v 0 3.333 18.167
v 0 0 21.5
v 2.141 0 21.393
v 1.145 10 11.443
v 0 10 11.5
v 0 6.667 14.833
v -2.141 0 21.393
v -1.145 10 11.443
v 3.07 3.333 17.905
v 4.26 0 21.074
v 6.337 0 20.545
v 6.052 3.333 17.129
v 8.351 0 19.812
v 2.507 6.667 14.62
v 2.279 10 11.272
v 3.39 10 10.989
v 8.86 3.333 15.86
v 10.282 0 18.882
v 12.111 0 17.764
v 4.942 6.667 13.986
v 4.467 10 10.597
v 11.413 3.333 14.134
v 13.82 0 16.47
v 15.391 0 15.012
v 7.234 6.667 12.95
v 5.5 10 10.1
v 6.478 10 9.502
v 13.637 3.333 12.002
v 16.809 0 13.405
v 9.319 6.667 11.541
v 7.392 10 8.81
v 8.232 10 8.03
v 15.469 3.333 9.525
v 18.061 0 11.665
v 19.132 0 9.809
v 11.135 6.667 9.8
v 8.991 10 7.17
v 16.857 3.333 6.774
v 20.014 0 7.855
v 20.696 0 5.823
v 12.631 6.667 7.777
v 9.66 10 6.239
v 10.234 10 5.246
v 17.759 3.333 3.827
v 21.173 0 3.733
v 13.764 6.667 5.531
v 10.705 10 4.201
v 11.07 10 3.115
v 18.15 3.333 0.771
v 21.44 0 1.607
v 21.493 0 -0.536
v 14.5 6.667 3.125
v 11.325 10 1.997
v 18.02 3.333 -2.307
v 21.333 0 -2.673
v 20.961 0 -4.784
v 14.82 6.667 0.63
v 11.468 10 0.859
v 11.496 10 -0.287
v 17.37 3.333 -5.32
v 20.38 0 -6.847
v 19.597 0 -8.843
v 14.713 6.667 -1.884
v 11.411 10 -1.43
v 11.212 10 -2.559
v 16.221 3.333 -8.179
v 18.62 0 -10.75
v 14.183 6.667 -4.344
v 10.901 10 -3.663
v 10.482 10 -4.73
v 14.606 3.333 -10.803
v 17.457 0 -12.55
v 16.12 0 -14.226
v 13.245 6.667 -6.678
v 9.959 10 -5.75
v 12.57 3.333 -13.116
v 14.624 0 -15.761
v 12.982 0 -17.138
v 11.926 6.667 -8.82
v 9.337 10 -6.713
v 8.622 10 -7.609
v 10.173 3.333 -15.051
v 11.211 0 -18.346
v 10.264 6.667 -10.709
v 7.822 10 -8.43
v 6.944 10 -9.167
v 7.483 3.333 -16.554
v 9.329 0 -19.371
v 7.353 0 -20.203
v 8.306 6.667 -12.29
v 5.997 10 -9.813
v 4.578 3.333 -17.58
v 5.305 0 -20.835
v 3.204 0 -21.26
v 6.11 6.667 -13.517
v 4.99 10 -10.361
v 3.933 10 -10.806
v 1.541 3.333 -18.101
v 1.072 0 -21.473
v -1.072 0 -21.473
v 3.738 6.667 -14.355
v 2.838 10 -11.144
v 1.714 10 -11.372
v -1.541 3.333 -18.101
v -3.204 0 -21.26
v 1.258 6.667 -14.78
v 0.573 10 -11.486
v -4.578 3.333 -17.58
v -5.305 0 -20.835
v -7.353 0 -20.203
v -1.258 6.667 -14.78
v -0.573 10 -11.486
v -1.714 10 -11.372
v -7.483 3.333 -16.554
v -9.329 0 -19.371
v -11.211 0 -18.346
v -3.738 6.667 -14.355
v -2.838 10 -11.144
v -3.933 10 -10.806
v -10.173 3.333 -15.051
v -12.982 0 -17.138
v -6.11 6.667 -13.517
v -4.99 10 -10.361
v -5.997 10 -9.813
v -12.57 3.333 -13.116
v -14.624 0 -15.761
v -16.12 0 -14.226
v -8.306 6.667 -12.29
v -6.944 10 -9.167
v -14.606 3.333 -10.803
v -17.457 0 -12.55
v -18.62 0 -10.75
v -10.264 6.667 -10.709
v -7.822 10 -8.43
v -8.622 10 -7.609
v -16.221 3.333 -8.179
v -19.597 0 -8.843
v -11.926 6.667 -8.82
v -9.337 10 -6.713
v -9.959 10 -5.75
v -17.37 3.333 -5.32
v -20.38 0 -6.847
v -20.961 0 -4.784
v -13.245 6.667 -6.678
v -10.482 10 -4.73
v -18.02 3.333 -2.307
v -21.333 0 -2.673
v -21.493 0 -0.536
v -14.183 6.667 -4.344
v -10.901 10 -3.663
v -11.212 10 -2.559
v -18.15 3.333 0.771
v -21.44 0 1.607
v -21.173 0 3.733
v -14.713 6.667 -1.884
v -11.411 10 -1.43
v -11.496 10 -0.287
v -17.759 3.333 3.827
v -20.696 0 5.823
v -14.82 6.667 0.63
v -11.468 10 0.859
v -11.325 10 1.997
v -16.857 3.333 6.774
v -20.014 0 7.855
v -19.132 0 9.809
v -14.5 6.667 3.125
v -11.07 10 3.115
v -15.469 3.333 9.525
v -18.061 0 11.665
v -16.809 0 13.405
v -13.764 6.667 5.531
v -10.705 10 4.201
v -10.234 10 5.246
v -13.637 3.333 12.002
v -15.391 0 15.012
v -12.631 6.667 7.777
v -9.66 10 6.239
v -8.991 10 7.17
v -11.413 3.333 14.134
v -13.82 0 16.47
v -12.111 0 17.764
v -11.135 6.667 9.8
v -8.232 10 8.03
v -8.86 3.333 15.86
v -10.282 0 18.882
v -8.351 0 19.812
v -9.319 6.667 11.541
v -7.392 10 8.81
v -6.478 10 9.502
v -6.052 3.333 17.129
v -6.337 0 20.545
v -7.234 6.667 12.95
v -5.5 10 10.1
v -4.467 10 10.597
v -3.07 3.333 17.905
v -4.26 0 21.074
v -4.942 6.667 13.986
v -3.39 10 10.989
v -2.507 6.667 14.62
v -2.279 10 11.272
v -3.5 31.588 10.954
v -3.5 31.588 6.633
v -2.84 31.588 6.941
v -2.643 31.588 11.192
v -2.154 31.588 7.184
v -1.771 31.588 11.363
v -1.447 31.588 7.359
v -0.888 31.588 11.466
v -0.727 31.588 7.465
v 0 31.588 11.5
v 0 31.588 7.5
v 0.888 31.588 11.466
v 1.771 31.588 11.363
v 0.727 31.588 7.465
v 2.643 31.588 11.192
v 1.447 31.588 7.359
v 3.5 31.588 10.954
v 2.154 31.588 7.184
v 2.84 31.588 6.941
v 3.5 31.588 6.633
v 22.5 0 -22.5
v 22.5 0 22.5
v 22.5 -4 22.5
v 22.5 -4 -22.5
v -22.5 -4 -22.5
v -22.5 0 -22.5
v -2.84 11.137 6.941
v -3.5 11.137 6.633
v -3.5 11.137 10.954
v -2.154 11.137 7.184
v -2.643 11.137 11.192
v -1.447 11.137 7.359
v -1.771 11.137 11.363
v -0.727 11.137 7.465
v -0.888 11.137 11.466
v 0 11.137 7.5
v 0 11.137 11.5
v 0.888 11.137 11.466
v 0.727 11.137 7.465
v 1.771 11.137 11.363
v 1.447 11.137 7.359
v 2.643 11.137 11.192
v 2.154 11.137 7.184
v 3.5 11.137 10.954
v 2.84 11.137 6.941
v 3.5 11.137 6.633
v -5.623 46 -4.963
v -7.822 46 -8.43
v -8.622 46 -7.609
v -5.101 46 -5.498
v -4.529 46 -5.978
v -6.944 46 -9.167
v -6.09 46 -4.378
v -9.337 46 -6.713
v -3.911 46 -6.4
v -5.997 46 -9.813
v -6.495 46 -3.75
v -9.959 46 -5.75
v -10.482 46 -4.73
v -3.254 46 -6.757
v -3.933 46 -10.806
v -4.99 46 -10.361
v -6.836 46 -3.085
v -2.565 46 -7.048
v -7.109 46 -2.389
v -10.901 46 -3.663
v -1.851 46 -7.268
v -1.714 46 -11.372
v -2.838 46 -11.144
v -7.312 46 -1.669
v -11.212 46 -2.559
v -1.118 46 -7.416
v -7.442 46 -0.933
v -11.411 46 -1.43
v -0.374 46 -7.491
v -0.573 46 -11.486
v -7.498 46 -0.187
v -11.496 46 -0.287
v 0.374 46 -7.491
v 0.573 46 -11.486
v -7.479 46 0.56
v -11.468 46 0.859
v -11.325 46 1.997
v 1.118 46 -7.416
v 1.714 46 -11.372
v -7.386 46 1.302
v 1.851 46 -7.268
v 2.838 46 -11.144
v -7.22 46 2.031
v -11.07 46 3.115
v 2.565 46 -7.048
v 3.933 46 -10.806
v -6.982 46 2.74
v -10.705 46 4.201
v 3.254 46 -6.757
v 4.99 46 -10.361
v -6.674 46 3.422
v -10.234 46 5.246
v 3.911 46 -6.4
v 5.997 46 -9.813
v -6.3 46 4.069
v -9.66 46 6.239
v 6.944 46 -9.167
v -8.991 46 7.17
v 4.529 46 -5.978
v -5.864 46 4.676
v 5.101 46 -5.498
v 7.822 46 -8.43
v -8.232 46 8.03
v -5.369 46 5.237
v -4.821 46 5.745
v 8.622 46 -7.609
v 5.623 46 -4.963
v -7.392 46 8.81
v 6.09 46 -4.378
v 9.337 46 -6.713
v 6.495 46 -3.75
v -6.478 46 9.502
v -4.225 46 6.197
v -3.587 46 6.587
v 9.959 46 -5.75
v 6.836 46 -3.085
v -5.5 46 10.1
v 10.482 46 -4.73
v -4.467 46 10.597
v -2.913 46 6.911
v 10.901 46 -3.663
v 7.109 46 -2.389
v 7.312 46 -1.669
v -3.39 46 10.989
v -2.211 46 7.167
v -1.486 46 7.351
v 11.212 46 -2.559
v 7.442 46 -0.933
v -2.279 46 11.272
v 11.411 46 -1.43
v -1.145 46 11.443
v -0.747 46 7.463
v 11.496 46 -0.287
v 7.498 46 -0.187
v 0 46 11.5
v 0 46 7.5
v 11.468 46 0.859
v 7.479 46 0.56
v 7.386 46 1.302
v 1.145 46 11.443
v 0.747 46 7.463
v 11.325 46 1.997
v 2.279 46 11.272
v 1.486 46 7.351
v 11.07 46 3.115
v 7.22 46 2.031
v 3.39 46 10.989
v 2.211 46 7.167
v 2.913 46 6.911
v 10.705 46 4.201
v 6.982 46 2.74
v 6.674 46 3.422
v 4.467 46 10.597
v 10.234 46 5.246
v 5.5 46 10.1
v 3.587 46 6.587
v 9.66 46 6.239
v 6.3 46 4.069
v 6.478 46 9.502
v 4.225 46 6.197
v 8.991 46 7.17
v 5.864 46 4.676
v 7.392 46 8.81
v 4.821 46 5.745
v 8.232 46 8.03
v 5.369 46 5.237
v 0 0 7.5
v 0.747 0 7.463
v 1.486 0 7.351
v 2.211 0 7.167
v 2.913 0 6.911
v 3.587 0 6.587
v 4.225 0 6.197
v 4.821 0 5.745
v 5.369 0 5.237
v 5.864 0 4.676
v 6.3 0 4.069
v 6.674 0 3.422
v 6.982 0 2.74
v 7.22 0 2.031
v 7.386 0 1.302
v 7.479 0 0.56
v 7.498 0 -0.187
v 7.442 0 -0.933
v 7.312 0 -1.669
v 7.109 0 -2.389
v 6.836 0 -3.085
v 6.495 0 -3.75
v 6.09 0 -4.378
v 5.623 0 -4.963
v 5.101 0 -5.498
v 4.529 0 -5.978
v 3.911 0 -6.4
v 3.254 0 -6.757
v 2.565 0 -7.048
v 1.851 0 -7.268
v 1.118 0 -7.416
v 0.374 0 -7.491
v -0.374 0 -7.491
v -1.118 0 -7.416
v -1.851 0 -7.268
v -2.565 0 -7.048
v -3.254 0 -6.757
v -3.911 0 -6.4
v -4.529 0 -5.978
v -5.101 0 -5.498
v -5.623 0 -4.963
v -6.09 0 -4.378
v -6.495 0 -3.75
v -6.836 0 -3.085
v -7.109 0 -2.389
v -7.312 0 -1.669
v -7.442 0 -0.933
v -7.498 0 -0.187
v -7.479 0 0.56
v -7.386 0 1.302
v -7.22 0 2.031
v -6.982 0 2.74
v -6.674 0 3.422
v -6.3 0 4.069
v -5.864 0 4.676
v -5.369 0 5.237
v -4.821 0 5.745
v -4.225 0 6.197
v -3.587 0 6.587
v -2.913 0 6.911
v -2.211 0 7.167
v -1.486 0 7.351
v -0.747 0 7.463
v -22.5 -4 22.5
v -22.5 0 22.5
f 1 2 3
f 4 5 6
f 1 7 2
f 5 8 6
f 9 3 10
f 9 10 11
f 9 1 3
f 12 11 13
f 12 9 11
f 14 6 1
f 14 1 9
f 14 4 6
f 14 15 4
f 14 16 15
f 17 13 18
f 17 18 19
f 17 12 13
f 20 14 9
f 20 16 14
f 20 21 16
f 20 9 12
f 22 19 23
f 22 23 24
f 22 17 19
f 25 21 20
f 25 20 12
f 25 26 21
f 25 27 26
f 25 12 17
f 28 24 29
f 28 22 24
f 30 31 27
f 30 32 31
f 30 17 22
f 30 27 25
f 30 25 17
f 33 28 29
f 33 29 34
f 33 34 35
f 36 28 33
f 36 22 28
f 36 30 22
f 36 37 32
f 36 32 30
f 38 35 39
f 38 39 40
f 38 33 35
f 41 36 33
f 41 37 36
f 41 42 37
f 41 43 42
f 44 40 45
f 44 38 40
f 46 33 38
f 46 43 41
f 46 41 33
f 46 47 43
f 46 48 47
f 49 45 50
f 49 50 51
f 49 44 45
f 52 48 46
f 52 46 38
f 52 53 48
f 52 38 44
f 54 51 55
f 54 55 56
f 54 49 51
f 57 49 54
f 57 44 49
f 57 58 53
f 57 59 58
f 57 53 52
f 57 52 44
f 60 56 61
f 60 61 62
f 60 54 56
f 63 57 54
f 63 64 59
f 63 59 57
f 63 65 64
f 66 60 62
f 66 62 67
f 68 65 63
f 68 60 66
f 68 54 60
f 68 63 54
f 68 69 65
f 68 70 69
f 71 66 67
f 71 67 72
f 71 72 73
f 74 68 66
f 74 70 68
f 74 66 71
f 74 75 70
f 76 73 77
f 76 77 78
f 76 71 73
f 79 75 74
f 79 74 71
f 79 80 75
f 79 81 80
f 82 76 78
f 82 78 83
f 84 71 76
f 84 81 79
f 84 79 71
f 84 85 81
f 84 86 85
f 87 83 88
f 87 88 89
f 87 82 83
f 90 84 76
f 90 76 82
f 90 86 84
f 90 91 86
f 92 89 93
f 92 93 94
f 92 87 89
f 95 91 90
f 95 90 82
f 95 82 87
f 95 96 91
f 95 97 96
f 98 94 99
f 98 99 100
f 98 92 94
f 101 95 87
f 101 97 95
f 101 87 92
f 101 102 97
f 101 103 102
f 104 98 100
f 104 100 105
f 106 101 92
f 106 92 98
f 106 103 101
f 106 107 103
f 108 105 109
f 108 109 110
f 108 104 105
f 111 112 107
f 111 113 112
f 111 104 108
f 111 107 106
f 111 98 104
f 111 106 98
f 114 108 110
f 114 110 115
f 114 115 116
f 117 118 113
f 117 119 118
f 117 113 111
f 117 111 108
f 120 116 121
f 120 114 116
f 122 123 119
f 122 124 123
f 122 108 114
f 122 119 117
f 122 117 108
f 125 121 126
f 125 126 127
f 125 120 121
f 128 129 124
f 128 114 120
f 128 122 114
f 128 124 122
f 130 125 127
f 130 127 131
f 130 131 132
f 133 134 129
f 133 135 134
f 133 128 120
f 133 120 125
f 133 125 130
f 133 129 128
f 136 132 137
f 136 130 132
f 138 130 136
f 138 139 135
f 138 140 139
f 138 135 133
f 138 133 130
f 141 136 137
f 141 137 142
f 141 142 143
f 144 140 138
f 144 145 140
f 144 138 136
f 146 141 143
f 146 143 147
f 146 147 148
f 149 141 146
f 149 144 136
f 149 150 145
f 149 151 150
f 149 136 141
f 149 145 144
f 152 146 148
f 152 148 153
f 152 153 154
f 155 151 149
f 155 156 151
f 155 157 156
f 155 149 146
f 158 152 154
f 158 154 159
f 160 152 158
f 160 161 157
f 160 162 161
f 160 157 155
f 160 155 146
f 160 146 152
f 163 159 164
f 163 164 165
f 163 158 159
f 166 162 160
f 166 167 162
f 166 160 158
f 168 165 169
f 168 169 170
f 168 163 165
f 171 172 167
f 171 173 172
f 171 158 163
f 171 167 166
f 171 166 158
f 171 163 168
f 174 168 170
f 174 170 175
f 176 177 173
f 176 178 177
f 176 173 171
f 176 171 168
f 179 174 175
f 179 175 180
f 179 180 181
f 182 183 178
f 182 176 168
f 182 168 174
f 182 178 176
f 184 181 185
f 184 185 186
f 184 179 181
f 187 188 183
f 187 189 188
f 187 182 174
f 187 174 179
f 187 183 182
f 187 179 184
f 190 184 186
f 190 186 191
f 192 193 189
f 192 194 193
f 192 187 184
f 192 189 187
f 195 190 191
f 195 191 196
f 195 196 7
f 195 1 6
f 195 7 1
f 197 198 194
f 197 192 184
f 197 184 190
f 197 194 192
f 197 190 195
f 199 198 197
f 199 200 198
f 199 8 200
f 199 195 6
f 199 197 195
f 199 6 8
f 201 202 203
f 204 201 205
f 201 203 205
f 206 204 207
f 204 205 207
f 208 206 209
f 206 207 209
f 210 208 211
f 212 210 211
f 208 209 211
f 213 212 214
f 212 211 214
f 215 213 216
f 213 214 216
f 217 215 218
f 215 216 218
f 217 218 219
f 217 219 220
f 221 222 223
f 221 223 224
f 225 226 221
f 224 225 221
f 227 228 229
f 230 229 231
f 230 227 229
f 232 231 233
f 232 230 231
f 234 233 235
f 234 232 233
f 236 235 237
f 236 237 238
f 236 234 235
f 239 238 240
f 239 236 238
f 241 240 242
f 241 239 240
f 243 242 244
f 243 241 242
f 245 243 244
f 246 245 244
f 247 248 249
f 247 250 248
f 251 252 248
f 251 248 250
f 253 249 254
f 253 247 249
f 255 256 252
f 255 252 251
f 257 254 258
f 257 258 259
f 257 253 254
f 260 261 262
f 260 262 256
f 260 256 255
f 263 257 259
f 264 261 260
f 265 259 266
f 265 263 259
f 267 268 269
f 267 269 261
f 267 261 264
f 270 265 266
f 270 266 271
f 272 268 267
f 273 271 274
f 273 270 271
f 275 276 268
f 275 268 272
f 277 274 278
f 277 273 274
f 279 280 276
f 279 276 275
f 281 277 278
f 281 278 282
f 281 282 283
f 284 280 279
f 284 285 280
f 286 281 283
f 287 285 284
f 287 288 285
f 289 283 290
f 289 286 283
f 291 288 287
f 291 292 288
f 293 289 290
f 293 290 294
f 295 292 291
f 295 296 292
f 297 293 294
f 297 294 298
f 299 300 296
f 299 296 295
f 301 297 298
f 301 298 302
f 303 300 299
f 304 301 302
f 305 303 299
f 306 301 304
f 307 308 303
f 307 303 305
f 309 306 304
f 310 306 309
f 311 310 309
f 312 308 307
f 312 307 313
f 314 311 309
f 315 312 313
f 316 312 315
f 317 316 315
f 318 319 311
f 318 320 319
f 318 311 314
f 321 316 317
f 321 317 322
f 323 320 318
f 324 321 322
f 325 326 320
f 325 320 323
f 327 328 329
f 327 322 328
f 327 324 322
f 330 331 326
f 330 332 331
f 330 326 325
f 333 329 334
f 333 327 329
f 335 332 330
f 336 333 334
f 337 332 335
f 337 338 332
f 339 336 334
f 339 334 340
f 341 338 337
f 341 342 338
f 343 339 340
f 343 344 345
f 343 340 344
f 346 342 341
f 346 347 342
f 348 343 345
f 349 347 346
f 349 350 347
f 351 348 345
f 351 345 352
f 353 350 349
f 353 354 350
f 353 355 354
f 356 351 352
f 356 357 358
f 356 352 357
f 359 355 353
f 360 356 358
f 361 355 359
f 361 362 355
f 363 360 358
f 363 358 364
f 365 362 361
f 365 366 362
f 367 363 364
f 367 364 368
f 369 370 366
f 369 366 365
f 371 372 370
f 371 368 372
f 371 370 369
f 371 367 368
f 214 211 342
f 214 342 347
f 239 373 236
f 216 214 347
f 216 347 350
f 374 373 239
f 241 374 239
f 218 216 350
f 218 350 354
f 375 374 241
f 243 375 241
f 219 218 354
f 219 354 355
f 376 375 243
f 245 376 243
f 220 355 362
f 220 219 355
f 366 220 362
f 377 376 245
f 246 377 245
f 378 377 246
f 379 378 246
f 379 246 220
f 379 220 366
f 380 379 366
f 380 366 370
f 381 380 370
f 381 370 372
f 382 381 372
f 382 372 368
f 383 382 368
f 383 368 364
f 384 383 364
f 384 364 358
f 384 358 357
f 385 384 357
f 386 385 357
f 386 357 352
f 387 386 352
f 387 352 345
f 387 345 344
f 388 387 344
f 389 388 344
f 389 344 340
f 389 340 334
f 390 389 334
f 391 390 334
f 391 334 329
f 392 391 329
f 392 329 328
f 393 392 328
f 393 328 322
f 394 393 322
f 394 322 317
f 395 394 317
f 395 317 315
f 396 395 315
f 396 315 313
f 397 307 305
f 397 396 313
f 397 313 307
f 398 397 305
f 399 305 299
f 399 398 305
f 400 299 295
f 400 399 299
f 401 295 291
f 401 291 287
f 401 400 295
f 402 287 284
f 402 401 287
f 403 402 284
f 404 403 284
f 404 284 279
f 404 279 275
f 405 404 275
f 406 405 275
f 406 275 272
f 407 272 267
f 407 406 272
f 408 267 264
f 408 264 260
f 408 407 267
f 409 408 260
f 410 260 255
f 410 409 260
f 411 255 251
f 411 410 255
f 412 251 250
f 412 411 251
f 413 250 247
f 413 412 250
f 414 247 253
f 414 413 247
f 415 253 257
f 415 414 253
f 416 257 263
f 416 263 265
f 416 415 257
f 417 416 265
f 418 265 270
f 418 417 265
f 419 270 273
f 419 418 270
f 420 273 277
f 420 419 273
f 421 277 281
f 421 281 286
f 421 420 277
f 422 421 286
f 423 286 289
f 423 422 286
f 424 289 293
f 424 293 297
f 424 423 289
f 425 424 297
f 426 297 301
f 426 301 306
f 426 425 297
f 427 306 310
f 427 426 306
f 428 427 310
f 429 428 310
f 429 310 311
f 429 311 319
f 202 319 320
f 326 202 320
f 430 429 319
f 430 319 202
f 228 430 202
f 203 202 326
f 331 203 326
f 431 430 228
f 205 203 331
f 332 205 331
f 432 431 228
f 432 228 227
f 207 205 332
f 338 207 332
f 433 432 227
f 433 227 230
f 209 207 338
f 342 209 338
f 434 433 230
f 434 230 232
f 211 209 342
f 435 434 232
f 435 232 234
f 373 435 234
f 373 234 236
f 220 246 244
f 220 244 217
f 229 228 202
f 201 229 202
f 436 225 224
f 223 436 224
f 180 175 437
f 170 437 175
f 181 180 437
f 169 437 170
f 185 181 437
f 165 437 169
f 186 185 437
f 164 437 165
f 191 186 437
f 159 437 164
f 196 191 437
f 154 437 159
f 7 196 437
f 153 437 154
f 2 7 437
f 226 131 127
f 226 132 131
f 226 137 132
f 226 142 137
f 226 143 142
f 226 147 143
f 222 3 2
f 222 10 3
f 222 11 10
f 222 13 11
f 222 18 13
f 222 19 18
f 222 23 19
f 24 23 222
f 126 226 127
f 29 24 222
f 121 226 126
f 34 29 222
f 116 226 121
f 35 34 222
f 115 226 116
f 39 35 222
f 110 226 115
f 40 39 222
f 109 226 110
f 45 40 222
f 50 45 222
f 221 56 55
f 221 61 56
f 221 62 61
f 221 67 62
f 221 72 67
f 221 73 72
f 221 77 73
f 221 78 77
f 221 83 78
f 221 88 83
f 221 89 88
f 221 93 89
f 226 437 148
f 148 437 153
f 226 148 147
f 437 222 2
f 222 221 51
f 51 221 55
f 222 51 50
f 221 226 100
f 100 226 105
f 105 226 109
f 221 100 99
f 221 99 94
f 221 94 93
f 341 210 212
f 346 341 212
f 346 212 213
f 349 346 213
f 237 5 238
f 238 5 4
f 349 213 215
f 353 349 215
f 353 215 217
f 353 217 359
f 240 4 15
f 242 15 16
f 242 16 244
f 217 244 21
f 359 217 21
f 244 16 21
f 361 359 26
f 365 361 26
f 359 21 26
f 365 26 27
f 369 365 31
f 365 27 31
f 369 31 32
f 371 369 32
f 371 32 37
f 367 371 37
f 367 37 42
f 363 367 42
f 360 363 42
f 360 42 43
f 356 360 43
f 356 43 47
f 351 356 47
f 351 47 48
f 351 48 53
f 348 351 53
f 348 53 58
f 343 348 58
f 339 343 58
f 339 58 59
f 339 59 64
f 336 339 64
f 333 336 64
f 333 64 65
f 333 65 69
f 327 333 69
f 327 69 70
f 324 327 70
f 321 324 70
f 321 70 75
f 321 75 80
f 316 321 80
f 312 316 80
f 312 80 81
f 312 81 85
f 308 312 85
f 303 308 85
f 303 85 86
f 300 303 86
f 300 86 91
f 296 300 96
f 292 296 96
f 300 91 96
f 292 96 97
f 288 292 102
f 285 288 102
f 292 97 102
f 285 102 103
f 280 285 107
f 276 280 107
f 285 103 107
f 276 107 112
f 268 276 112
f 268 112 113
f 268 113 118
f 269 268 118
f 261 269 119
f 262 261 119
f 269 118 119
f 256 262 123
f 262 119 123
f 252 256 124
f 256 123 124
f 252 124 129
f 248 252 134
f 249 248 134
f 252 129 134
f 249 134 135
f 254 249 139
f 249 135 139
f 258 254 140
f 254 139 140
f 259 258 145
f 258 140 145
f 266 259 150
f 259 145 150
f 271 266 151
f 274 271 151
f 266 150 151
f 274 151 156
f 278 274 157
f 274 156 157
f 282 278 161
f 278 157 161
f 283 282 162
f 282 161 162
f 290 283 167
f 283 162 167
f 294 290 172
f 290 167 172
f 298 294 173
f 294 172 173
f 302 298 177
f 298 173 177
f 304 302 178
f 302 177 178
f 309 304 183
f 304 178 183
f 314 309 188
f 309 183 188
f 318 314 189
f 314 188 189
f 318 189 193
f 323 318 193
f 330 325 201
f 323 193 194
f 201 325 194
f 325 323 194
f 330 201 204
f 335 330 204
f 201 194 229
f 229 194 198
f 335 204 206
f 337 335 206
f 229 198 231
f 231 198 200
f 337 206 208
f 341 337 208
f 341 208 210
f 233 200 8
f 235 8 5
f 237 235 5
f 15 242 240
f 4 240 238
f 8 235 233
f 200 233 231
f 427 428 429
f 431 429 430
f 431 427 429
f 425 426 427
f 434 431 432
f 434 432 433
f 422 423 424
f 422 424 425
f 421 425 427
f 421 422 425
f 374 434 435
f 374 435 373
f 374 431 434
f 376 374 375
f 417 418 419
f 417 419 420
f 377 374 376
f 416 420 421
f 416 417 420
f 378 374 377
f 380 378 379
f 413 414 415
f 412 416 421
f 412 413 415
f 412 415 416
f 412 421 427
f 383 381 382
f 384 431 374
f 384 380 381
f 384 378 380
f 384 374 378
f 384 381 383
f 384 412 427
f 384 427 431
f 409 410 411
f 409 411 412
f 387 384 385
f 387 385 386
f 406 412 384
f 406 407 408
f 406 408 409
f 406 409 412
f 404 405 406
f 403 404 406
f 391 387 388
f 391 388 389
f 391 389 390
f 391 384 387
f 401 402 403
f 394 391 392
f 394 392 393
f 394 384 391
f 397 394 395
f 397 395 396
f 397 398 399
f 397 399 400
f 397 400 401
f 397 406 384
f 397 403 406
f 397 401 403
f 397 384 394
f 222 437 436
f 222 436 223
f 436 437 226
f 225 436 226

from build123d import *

# Parameters (mm, degrees)
SKETCH2_W           = 45
SKETCH2_H           = 45
BOSS_EXTRUDE1_DEPTH = 4
SKETCH2_3_R         = 11.5
SKETCH2_3_R_2       = 7.5
BOSS_EXTRUDE2_DEPTH = 46
CHAMFER1_SIZE       = 10
SKETCH3_W           = 7
SKETCH3_H           = 20.450898806
CUT_EXTRUDE1_DEPTH  = 19


with BuildPart() as part:
    # Sketch2 → Boss-Extrude1 (new body)
    with BuildSketch(Plane(origin=(0, 0, 0), x_dir=(1, 0, 0), z_dir=(0, 1, 0))):
        Rectangle(SKETCH2_W, SKETCH2_H)
    extrude(amount=-BOSS_EXTRUDE1_DEPTH)

    # Sketch2<3> → Boss-Extrude2 (add)
    with BuildSketch(Plane(origin=(0, 0, 0), x_dir=(1, 0, 0), z_dir=(0, 1, 0))):
        Circle(SKETCH2_3_R)
        Circle(SKETCH2_3_R_2, mode=Mode.SUBTRACT)
    extrude(amount=BOSS_EXTRUDE2_DEPTH)

    # Chamfer1
    chamfer1_edges = [part.edges().sort_by_distance(p)[0] for p in [
        (-11.5, 0, 0),
    ]]
    chamfer(chamfer1_edges, length=CHAMFER1_SIZE)

    # Sketch3 → Cut-Extrude1 (cut)
    with BuildSketch(Plane.XY):
        with Locations((0, 21.362604589)):
            Rectangle(SKETCH3_W, SKETCH3_H)
    extrude(amount=CUT_EXTRUDE1_DEPTH, mode=Mode.SUBTRACT)


solid = part.part
